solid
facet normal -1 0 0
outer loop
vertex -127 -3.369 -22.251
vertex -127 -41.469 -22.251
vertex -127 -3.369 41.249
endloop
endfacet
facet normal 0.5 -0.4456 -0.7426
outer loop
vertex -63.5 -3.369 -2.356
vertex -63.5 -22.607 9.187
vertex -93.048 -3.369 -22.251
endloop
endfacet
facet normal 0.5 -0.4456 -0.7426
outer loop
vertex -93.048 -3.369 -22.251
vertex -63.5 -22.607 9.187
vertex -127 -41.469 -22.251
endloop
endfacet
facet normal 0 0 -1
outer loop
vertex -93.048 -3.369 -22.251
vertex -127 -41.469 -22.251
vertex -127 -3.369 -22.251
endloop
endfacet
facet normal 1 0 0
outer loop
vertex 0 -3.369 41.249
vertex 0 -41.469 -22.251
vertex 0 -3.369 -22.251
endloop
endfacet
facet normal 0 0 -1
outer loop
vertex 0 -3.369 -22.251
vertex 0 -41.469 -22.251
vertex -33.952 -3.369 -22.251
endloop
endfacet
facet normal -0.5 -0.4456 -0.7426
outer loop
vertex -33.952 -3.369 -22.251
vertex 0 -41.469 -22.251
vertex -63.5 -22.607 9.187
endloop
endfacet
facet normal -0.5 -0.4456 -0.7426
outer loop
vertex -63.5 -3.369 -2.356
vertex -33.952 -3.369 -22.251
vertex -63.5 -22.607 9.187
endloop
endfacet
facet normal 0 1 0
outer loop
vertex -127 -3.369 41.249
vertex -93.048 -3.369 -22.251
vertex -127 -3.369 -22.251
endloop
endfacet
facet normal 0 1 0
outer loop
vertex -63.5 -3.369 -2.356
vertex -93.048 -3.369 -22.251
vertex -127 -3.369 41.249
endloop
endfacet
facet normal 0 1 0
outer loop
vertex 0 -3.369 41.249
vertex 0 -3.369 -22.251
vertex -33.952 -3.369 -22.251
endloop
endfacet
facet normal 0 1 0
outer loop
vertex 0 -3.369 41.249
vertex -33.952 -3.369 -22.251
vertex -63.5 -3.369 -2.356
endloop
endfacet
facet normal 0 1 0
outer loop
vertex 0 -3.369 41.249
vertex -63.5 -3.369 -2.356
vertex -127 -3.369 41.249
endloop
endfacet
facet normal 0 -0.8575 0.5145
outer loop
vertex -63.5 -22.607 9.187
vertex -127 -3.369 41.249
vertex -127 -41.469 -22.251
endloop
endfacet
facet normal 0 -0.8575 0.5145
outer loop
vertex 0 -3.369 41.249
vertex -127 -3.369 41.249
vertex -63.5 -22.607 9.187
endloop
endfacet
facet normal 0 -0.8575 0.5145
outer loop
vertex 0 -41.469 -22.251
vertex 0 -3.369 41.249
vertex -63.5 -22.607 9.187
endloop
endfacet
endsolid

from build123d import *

# Parameters (mm, degrees)
F1_DEPTH = 127
F3_DEPTH = 32.67148


with BuildPart() as f1:
    # F0 (on Right) → F1 (new body)
    with BuildSketch(Plane.YZ):
        Polygon((-3.369482, -22.250649), (-3.369482, 41.249351), (-41.469482, -22.250649), align=None)
    extrude(amount=-F1_DEPTH)

    # F2 (on face) → F3 (cut, through all)
    with BuildSketch(Plane(origin=(0, -20.675804, 12.405482), x_dir=(1, 0, 0), z_dir=(0, -0.857493, 0.514496))):
        Polygon((-127, -40.415646), (0, -40.415646), (-63.5, -3.753904), align=None)
    extrude(amount=-F3_DEPTH, mode=Mode.SUBTRACT)


solid = f1.part
